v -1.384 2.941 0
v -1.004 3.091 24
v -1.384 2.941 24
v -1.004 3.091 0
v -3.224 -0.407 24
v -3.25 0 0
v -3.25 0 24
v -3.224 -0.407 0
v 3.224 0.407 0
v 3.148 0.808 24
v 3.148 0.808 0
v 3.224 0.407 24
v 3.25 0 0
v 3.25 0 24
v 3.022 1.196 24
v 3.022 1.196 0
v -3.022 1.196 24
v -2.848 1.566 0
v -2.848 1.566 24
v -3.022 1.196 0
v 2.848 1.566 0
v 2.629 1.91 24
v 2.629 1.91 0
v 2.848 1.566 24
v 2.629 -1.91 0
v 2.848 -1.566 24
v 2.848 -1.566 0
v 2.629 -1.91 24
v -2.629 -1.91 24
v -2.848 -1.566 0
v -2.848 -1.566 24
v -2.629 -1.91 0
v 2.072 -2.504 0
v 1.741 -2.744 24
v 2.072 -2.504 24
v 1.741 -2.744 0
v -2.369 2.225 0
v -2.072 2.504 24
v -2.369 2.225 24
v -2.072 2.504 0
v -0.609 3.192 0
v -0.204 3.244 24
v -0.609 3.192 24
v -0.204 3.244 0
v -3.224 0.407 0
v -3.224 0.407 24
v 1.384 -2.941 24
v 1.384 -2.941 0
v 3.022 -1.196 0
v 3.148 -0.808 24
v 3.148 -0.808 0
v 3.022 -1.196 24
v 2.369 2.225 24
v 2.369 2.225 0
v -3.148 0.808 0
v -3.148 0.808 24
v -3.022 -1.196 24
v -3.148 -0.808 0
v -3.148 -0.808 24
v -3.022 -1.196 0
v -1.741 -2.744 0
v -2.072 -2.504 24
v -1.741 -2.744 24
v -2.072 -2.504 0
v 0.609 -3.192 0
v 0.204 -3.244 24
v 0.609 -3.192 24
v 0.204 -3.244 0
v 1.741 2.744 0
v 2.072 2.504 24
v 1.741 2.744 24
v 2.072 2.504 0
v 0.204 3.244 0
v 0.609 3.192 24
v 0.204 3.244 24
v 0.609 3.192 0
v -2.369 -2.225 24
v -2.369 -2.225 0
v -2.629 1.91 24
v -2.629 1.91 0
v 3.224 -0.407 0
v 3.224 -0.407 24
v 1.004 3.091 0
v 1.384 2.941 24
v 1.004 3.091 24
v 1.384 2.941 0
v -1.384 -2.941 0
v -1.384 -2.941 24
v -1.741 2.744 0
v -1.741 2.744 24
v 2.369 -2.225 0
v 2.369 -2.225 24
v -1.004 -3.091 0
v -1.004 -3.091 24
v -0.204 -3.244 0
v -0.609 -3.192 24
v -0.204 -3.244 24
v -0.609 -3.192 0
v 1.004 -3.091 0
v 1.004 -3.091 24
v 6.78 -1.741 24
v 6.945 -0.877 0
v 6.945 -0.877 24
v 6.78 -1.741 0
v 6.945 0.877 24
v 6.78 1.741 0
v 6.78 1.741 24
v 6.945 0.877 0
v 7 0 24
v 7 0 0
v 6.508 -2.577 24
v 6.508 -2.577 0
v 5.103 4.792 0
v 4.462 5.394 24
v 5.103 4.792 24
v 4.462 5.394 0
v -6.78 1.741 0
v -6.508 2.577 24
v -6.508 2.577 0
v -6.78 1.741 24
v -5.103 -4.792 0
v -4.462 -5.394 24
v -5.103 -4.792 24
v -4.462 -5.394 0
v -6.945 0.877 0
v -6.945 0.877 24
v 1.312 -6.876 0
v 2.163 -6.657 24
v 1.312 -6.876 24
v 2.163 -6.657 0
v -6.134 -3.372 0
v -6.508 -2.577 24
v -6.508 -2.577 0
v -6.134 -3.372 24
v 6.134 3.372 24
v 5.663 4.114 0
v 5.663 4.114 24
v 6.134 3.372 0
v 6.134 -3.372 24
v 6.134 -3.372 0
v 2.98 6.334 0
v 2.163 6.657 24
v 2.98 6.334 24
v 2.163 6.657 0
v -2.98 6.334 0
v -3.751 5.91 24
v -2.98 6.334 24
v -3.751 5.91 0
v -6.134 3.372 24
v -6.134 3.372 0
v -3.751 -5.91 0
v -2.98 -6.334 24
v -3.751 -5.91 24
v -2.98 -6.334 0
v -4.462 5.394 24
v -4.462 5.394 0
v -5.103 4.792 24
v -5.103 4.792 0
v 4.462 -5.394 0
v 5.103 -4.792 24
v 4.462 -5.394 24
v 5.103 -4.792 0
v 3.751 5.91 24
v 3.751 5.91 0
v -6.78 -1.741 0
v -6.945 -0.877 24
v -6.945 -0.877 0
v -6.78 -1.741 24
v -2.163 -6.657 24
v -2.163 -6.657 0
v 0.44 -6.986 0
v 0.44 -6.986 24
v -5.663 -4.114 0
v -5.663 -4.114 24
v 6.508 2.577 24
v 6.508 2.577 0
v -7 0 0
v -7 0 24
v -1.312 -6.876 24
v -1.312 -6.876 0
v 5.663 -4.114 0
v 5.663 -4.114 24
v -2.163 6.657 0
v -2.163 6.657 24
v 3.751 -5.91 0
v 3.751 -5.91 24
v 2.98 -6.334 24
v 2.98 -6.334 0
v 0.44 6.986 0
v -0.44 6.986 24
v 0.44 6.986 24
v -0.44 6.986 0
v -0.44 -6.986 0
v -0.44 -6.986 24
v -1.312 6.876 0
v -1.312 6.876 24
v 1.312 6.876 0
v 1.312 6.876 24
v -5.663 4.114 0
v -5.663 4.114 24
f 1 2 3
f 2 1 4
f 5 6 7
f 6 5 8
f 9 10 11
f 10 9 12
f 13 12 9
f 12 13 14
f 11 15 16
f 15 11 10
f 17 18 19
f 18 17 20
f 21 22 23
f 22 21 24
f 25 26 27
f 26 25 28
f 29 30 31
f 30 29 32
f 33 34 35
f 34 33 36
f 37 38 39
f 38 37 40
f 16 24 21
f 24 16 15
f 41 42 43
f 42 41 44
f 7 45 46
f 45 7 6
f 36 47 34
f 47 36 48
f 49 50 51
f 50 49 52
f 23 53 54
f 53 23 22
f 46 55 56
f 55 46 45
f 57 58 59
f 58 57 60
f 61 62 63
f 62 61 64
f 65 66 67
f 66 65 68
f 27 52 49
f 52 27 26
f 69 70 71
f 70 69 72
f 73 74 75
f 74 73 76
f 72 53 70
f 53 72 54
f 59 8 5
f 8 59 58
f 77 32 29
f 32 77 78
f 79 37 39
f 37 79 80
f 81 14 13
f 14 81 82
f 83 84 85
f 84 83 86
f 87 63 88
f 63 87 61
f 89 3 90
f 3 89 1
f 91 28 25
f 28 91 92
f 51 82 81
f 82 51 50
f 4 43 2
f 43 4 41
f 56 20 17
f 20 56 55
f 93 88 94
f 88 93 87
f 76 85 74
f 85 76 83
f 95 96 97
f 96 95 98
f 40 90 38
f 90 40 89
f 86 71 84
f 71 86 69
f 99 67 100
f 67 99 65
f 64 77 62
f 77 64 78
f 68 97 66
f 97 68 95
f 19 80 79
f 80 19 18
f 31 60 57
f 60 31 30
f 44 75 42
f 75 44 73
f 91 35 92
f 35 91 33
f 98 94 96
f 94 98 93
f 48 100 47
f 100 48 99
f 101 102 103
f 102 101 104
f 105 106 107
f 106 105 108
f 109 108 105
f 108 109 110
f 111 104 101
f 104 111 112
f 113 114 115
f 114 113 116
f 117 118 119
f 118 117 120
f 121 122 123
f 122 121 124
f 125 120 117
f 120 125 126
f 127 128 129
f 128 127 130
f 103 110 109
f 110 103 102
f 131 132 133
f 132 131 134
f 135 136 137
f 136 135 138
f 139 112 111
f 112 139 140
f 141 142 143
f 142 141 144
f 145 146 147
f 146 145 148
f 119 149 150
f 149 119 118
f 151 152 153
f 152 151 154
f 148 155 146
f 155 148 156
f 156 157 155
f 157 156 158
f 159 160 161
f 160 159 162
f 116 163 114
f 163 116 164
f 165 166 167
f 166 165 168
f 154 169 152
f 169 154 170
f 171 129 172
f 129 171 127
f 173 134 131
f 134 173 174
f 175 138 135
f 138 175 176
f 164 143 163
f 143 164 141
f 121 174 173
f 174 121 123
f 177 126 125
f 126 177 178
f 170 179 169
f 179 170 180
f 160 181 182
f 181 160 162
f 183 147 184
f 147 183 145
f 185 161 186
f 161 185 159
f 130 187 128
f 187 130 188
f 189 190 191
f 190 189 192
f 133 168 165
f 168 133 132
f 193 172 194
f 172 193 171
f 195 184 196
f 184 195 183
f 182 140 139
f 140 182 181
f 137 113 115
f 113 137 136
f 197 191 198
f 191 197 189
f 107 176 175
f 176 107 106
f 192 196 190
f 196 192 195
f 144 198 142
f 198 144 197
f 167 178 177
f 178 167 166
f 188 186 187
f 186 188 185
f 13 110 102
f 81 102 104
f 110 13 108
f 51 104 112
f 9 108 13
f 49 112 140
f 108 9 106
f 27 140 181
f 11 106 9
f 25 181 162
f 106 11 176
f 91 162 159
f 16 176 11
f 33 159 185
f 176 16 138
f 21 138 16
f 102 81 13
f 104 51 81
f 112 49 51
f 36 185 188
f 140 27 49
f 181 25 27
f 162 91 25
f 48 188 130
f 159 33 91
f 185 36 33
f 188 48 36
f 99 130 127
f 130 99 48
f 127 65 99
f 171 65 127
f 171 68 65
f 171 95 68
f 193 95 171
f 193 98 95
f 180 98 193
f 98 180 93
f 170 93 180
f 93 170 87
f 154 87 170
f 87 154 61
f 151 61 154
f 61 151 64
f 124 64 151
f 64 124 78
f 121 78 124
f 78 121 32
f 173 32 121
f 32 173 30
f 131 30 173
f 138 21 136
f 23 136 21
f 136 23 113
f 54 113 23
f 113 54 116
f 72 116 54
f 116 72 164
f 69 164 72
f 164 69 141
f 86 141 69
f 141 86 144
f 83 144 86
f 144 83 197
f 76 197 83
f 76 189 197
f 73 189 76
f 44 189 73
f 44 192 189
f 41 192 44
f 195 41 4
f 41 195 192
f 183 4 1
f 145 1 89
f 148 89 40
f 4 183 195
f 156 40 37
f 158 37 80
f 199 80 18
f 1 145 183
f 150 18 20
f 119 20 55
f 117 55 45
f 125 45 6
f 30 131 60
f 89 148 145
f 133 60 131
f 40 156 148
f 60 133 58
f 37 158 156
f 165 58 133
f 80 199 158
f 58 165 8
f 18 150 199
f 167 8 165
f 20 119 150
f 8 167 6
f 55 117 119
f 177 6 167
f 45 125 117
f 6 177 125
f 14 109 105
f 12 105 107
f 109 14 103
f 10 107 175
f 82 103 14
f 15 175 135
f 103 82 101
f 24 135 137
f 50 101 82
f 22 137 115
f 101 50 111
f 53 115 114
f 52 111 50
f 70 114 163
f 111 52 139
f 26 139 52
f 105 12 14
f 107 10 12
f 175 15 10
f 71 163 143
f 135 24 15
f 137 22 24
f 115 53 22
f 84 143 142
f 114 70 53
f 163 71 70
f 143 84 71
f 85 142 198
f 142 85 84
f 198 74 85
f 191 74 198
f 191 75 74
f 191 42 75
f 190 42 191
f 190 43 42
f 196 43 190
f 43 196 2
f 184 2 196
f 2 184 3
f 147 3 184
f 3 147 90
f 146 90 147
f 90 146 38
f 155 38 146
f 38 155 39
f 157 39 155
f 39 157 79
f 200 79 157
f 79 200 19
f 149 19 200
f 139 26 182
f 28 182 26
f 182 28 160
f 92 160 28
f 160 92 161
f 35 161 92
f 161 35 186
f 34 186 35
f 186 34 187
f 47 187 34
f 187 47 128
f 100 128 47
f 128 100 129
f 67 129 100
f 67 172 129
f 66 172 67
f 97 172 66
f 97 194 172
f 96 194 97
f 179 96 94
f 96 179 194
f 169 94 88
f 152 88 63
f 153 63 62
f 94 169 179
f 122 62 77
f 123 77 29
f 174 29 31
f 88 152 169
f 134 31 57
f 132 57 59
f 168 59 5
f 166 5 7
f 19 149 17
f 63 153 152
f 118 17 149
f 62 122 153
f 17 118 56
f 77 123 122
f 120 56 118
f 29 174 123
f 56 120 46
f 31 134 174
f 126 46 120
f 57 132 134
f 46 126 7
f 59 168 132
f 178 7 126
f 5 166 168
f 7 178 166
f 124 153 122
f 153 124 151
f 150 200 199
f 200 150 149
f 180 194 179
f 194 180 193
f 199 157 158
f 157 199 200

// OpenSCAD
$fn = 50;


difference() {
	union() {
		*color(alpha = 1.0000000000, c = "gray") {
			translate(v = [0, 7, 0]) {
				linear_extrude(height = 1) {
					text(font = "Arial:style=Bold", halign = "center", size = 4.5000000000, text = "COMMENT plate main", valign = "center");
				}
			}
		}
		cylinder(h = 24, r = 7.0000000000);
	}
	union() {
		*color(alpha = 1.0000000000, c = "gray") {
			translate(v = [0, 7, 0]) {
				linear_extrude(height = 1) {
					text(font = "Arial:style=Bold", halign = "center", size = 4.5000000000, text = "COMMENT holes main", valign = "center");
				}
			}
		}
		translate(v = [0, 0, -100]) {
			cylinder(h = 200, r = 3.2500000000);
		}
		translate(v = [0, 0, -100]) {
			cylinder(h = 200, r = 1.8000000000);
		}
	}
}
